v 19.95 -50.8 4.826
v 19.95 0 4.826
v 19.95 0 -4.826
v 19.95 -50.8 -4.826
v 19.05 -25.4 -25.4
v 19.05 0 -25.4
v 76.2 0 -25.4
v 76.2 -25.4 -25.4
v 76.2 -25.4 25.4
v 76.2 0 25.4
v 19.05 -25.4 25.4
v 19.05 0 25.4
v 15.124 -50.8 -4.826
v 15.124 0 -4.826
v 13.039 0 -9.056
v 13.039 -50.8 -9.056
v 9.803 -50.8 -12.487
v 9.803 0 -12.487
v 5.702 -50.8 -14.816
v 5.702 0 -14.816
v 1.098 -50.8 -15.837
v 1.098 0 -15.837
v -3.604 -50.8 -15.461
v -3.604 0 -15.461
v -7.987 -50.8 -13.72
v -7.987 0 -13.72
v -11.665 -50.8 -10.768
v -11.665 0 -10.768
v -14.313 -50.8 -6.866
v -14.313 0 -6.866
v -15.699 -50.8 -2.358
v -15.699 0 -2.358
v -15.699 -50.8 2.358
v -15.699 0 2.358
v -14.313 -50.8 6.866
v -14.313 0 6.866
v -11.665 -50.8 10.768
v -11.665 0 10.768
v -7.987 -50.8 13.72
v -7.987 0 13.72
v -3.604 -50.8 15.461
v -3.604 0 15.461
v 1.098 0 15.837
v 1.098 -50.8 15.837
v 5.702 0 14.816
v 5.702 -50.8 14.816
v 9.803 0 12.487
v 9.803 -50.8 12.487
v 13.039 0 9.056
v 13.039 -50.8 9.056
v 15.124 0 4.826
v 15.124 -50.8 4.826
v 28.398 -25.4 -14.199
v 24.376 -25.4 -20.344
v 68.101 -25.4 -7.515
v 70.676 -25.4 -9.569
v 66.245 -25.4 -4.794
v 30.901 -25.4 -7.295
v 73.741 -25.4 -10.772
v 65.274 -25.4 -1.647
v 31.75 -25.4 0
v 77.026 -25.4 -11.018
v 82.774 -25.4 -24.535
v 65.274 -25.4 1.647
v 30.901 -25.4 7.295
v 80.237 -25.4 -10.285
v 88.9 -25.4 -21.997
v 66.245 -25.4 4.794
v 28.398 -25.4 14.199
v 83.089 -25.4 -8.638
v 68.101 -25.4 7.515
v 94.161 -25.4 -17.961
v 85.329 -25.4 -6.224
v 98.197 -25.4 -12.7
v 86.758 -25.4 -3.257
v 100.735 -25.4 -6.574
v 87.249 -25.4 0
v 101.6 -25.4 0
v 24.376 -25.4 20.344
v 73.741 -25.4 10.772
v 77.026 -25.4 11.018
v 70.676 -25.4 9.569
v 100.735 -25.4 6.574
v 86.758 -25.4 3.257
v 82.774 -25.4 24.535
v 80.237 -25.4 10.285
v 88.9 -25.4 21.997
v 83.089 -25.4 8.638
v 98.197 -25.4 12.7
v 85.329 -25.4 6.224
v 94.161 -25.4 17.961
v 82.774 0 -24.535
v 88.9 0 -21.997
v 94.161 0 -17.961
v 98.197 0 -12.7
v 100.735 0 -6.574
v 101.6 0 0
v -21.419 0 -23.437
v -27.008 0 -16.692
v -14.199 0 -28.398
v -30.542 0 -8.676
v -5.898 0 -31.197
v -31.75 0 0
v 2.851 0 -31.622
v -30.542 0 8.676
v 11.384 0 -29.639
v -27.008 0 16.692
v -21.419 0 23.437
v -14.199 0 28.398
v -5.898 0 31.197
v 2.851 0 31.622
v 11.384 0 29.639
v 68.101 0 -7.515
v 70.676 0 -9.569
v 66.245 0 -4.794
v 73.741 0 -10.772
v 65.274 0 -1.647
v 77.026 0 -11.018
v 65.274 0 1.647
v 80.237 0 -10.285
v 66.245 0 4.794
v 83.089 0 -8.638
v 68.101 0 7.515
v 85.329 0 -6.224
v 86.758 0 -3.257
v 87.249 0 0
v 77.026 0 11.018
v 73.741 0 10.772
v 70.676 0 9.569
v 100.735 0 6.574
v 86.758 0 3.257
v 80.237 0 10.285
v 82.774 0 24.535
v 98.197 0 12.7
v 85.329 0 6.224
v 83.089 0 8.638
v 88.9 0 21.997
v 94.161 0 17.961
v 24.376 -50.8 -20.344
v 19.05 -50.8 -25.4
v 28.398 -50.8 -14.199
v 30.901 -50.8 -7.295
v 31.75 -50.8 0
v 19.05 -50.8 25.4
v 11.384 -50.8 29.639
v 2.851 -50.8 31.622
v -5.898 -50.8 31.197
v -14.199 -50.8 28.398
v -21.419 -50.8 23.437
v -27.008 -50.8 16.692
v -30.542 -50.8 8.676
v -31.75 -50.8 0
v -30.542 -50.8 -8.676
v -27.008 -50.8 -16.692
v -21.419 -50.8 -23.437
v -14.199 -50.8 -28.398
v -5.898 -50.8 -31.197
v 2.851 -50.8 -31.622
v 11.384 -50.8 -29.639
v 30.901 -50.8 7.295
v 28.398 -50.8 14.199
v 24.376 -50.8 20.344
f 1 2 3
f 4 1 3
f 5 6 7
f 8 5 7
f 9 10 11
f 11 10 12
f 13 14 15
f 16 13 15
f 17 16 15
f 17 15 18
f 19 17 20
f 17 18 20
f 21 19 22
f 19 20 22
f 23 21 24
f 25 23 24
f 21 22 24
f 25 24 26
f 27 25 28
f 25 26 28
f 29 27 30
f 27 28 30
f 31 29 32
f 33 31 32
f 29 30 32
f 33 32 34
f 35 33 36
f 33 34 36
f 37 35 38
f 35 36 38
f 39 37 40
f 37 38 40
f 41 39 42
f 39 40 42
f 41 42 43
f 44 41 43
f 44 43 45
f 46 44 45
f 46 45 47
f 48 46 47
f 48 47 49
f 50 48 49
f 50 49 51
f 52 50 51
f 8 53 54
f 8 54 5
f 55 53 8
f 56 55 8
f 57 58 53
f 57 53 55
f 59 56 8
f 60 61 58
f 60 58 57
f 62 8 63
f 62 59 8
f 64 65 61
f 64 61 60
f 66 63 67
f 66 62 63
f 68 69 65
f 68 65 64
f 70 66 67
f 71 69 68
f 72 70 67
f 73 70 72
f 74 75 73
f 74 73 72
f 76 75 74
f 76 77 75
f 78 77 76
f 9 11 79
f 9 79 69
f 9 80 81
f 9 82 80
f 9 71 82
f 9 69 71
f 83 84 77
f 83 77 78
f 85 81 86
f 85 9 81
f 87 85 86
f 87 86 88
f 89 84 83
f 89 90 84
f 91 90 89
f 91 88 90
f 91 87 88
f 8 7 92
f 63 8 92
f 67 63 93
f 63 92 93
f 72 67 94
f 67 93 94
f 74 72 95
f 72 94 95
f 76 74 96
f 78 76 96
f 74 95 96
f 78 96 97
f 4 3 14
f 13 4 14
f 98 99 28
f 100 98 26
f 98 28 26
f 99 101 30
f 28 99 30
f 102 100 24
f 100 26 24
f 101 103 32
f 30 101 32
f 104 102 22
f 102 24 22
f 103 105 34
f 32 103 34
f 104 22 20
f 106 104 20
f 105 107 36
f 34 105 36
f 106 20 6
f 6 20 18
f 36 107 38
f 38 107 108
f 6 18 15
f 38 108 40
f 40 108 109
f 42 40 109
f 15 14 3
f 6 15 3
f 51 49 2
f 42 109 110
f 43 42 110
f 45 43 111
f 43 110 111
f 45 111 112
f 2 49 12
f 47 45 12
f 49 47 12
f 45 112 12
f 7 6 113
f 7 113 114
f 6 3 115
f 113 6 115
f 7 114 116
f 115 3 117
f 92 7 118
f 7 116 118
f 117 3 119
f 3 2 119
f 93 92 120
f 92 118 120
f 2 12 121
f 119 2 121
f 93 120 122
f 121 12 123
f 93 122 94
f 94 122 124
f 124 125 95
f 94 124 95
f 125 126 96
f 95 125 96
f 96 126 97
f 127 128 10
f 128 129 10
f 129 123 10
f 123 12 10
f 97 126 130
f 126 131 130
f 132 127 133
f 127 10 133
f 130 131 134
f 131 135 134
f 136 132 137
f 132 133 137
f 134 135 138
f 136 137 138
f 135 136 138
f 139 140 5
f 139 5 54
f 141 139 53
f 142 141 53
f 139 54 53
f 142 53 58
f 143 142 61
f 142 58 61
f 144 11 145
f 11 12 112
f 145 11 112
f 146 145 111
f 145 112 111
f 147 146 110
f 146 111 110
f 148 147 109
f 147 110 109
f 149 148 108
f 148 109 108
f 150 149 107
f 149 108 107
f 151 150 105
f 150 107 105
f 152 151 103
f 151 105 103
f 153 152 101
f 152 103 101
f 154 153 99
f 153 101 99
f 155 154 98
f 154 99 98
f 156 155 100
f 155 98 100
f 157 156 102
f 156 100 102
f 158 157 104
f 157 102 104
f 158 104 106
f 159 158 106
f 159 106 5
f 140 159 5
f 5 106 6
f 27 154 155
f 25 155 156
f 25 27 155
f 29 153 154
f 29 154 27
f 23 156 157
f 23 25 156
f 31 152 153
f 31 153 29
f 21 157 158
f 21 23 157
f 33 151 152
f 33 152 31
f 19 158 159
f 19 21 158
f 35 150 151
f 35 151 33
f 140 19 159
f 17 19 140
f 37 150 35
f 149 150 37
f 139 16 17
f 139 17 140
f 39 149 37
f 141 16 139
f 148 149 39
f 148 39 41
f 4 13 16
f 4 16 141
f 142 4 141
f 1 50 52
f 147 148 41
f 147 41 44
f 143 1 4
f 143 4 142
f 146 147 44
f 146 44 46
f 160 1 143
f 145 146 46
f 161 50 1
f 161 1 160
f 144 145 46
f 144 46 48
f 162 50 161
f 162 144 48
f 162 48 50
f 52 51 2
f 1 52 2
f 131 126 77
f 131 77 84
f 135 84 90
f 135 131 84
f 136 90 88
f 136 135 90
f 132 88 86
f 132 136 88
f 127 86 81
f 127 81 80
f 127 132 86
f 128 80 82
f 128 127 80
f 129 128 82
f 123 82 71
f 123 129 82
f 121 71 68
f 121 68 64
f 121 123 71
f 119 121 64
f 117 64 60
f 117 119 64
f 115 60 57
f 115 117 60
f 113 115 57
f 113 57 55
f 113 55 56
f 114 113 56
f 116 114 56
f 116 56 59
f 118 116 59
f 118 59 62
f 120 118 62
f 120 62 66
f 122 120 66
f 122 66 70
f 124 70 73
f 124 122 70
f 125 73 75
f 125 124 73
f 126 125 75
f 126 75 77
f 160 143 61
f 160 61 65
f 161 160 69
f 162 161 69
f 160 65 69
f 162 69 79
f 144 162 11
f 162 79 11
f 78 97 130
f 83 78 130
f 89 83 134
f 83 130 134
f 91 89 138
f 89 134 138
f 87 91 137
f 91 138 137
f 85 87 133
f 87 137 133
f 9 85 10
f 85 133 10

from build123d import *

# Parameters (mm, degrees)
F0_R     = 11.049
F1_DEPTH = 25.4
F2_DEPTH = 50.8


# Not quite as in the source:
# - a feature names something its author has since deleted; it is built from what else it names


with BuildPart() as f1:
    # F0 (on Front) → F1 (new body)
    with BuildSketch(Plane.XZ):
        with BuildLine():
            ThreePointArc((101.6, 0), (94.1605122421, 17.9605122421), (76.2, 25.4))
            ThreePointArc((76.2, 25.4), (50.8, 0), (76.2, -25.4))
            ThreePointArc((76.2, -25.4), (94.1605122421, -17.9605122421), (101.6, 0))
        make_face()
        with Locations((76.2, 0)):
            Circle(F0_R, mode=Mode.SUBTRACT)
        with BuildLine():
            ThreePointArc((19.05, 25.4), (28.3980633142, 14.1990316571), (31.75, 0))
            ThreePointArc((31.75, 0), (28.3980633142, -14.1990316571), (19.05, -25.4))
            Line((19.05, -25.4), (76.2, -25.4))
            ThreePointArc((76.2, -25.4), (50.8, 0), (76.2, 25.4))
            Line((76.2, 25.4), (19.05, 25.4))
        make_face()
    extrude(amount=F1_DEPTH)

    # F0 (on Front) → F2 (join)
    with BuildSketch(Plane.XZ):
        with BuildLine():
            ThreePointArc((19.05, -25.4), (28.3980633142, -14.1990316571), (31.75, 0))
            ThreePointArc((31.75, 0), (28.3980633142, 14.1990316571), (19.05, 25.4))
            ThreePointArc((19.05, 25.4), (-31.75, 0), (19.05, -25.4))
        make_face()
        with BuildLine():
            ThreePointArc((15.1236685034, -4.826), (-15.875, 0), (15.1236685034, 4.826))
            Line((15.1236685034, 4.826), (19.9496685034, 4.826))
            Line((19.9496685034, 4.826), (19.9496685034, -4.826))
            Line((19.9496685034, -4.826), (15.1236685034, -4.826))
        make_face(mode=Mode.SUBTRACT)
    extrude(amount=F2_DEPTH)


solid = f1.part
